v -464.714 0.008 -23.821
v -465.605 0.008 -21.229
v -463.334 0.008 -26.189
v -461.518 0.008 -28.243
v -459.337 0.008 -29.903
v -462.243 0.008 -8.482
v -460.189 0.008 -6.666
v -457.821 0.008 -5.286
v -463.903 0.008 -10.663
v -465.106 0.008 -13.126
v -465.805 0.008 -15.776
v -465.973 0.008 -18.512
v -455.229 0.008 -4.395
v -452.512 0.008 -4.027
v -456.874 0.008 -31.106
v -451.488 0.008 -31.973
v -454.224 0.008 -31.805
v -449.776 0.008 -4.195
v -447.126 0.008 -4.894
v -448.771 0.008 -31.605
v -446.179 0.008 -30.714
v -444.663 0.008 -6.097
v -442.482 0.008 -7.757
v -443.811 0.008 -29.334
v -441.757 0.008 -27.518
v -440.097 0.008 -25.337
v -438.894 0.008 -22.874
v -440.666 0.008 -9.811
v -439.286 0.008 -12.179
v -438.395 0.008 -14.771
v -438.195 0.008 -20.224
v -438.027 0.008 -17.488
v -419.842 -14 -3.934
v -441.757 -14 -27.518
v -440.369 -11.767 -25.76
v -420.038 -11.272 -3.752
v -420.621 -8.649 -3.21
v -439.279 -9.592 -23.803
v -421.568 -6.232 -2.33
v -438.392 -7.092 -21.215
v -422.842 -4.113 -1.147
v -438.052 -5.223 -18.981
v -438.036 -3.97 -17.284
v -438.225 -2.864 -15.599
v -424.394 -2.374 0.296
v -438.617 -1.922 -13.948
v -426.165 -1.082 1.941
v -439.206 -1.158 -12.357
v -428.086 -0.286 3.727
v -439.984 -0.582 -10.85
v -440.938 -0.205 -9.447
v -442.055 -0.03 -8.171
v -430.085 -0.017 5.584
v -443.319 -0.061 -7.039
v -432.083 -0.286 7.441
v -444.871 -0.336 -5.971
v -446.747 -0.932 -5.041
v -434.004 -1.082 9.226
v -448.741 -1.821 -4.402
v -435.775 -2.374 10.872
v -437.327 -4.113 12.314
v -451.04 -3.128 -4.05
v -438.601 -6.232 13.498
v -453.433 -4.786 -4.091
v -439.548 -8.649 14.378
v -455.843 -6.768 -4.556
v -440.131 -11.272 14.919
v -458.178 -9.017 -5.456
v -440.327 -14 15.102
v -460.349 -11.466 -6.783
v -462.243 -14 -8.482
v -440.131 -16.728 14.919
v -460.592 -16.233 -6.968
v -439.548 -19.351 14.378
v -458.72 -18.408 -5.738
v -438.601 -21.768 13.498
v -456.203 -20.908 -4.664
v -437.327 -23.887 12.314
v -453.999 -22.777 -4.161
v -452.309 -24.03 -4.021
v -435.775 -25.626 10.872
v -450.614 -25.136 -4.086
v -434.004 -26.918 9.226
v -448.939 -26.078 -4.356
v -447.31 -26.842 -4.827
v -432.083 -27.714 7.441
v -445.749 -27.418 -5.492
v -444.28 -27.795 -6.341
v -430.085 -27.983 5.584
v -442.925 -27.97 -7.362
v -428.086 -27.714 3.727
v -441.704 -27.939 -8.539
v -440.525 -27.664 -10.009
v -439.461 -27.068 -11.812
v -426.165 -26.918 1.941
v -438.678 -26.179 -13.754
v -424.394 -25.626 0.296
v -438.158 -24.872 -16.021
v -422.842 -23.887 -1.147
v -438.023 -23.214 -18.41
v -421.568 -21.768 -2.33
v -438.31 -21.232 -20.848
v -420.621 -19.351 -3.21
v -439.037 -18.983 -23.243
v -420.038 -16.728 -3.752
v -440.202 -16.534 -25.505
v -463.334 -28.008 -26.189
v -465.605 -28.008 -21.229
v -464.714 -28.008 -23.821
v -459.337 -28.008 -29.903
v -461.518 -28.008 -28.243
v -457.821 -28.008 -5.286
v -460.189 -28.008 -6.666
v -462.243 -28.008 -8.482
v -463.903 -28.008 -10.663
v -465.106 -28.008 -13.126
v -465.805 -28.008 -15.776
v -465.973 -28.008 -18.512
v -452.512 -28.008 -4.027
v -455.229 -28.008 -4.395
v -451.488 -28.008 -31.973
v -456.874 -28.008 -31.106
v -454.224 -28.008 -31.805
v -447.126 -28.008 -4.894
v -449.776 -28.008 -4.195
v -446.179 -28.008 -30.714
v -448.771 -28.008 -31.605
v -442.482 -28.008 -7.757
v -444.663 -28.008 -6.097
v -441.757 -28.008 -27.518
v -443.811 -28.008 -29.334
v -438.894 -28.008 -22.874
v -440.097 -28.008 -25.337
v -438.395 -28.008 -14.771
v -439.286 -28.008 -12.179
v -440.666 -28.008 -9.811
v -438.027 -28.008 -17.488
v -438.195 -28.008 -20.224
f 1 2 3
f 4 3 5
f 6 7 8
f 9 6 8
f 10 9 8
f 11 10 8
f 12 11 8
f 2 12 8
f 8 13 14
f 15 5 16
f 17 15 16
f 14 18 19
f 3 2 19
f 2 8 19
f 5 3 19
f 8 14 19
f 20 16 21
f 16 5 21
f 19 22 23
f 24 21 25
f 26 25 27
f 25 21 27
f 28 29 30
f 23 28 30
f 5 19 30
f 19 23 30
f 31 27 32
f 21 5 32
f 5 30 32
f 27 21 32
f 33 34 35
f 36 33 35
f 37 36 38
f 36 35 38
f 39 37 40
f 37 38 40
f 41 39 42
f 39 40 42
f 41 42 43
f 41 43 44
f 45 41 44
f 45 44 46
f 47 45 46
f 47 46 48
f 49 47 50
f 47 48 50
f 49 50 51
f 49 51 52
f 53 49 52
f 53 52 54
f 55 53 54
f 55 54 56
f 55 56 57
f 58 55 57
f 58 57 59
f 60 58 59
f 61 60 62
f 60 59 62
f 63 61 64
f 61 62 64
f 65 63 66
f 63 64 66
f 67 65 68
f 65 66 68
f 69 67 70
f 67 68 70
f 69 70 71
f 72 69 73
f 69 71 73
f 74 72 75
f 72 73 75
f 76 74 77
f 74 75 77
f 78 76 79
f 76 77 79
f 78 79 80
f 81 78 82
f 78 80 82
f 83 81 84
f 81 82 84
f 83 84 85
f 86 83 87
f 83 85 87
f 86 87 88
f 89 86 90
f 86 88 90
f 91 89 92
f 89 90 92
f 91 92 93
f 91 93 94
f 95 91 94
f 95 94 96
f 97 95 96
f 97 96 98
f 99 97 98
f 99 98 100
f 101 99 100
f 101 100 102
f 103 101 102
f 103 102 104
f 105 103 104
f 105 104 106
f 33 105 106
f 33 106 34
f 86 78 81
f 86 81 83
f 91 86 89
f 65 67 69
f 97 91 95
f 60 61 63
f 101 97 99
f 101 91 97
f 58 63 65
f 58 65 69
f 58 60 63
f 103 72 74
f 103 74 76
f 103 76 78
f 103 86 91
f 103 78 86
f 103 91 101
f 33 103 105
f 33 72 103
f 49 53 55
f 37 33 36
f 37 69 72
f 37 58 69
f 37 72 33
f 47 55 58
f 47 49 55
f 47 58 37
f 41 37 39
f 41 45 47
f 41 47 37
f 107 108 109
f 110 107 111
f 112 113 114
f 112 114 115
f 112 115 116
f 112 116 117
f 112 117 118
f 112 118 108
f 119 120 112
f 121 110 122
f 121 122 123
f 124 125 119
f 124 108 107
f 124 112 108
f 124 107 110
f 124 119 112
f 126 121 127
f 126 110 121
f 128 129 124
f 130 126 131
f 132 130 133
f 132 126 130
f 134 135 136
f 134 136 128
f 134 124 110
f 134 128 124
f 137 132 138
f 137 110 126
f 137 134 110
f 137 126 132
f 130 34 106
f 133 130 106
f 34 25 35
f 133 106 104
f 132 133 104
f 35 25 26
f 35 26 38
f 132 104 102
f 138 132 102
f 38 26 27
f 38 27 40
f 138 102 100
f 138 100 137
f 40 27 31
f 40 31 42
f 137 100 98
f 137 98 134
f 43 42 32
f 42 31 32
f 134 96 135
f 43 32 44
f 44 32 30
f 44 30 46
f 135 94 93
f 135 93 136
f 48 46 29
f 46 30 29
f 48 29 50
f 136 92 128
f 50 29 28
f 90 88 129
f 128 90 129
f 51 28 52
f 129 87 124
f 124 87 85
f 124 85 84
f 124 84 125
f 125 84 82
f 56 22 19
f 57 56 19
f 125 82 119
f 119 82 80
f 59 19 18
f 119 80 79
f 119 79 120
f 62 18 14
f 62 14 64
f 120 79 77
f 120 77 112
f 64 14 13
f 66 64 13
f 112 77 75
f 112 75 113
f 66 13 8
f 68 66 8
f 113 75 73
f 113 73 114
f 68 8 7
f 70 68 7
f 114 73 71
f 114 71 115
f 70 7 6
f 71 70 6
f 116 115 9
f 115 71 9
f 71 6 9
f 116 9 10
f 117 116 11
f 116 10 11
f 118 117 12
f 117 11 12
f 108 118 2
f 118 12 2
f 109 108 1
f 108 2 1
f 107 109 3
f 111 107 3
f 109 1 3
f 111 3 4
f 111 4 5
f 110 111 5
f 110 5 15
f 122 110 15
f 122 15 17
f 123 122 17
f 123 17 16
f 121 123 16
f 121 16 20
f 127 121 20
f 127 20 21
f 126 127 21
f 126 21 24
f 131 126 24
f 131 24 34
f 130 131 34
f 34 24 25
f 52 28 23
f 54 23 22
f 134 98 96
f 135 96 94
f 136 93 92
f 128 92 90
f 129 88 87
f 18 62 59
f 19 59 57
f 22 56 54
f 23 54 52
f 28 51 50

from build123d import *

# Parameters (mm, degrees)
CYLINDER068_R             = 13.9827
CYLINDER068_DEPTH         = 28.0162
CYLINDER067_R             = 13.9827
CYLINDER067_DEPTH         = 32.1945
FUSION026_PLACEMENT_ANGLE = 42.9


with BuildPart() as cylinder068:
    # Cylinder068 → Cylinder068 (new body)
    with BuildSketch(Plane.XZ.offset(-14.0081)):
        Circle(CYLINDER068_R)
    extrude(amount=CYLINDER068_DEPTH)


with BuildPart() as rear_inner_slip_l:
    # Cylinder067 → Cylinder067 (new body)
    with BuildSketch(Plane.XY):
        Circle(CYLINDER067_R)
    extrude(amount=CYLINDER067_DEPTH)

    # Fusion026: union Cylinder068
    add(cylinder068.part)


with BuildPart() as rear_inner_slip_l_1:
    # Fusion026 placement: moved
    add(rear_inner_slip_l.part.moved(Location((-452, -14, -18))).rotate(Axis((-452, -14, -18), (0, 1, 0)), FUSION026_PLACEMENT_ANGLE))


solid = rear_inner_slip_l_1.part
